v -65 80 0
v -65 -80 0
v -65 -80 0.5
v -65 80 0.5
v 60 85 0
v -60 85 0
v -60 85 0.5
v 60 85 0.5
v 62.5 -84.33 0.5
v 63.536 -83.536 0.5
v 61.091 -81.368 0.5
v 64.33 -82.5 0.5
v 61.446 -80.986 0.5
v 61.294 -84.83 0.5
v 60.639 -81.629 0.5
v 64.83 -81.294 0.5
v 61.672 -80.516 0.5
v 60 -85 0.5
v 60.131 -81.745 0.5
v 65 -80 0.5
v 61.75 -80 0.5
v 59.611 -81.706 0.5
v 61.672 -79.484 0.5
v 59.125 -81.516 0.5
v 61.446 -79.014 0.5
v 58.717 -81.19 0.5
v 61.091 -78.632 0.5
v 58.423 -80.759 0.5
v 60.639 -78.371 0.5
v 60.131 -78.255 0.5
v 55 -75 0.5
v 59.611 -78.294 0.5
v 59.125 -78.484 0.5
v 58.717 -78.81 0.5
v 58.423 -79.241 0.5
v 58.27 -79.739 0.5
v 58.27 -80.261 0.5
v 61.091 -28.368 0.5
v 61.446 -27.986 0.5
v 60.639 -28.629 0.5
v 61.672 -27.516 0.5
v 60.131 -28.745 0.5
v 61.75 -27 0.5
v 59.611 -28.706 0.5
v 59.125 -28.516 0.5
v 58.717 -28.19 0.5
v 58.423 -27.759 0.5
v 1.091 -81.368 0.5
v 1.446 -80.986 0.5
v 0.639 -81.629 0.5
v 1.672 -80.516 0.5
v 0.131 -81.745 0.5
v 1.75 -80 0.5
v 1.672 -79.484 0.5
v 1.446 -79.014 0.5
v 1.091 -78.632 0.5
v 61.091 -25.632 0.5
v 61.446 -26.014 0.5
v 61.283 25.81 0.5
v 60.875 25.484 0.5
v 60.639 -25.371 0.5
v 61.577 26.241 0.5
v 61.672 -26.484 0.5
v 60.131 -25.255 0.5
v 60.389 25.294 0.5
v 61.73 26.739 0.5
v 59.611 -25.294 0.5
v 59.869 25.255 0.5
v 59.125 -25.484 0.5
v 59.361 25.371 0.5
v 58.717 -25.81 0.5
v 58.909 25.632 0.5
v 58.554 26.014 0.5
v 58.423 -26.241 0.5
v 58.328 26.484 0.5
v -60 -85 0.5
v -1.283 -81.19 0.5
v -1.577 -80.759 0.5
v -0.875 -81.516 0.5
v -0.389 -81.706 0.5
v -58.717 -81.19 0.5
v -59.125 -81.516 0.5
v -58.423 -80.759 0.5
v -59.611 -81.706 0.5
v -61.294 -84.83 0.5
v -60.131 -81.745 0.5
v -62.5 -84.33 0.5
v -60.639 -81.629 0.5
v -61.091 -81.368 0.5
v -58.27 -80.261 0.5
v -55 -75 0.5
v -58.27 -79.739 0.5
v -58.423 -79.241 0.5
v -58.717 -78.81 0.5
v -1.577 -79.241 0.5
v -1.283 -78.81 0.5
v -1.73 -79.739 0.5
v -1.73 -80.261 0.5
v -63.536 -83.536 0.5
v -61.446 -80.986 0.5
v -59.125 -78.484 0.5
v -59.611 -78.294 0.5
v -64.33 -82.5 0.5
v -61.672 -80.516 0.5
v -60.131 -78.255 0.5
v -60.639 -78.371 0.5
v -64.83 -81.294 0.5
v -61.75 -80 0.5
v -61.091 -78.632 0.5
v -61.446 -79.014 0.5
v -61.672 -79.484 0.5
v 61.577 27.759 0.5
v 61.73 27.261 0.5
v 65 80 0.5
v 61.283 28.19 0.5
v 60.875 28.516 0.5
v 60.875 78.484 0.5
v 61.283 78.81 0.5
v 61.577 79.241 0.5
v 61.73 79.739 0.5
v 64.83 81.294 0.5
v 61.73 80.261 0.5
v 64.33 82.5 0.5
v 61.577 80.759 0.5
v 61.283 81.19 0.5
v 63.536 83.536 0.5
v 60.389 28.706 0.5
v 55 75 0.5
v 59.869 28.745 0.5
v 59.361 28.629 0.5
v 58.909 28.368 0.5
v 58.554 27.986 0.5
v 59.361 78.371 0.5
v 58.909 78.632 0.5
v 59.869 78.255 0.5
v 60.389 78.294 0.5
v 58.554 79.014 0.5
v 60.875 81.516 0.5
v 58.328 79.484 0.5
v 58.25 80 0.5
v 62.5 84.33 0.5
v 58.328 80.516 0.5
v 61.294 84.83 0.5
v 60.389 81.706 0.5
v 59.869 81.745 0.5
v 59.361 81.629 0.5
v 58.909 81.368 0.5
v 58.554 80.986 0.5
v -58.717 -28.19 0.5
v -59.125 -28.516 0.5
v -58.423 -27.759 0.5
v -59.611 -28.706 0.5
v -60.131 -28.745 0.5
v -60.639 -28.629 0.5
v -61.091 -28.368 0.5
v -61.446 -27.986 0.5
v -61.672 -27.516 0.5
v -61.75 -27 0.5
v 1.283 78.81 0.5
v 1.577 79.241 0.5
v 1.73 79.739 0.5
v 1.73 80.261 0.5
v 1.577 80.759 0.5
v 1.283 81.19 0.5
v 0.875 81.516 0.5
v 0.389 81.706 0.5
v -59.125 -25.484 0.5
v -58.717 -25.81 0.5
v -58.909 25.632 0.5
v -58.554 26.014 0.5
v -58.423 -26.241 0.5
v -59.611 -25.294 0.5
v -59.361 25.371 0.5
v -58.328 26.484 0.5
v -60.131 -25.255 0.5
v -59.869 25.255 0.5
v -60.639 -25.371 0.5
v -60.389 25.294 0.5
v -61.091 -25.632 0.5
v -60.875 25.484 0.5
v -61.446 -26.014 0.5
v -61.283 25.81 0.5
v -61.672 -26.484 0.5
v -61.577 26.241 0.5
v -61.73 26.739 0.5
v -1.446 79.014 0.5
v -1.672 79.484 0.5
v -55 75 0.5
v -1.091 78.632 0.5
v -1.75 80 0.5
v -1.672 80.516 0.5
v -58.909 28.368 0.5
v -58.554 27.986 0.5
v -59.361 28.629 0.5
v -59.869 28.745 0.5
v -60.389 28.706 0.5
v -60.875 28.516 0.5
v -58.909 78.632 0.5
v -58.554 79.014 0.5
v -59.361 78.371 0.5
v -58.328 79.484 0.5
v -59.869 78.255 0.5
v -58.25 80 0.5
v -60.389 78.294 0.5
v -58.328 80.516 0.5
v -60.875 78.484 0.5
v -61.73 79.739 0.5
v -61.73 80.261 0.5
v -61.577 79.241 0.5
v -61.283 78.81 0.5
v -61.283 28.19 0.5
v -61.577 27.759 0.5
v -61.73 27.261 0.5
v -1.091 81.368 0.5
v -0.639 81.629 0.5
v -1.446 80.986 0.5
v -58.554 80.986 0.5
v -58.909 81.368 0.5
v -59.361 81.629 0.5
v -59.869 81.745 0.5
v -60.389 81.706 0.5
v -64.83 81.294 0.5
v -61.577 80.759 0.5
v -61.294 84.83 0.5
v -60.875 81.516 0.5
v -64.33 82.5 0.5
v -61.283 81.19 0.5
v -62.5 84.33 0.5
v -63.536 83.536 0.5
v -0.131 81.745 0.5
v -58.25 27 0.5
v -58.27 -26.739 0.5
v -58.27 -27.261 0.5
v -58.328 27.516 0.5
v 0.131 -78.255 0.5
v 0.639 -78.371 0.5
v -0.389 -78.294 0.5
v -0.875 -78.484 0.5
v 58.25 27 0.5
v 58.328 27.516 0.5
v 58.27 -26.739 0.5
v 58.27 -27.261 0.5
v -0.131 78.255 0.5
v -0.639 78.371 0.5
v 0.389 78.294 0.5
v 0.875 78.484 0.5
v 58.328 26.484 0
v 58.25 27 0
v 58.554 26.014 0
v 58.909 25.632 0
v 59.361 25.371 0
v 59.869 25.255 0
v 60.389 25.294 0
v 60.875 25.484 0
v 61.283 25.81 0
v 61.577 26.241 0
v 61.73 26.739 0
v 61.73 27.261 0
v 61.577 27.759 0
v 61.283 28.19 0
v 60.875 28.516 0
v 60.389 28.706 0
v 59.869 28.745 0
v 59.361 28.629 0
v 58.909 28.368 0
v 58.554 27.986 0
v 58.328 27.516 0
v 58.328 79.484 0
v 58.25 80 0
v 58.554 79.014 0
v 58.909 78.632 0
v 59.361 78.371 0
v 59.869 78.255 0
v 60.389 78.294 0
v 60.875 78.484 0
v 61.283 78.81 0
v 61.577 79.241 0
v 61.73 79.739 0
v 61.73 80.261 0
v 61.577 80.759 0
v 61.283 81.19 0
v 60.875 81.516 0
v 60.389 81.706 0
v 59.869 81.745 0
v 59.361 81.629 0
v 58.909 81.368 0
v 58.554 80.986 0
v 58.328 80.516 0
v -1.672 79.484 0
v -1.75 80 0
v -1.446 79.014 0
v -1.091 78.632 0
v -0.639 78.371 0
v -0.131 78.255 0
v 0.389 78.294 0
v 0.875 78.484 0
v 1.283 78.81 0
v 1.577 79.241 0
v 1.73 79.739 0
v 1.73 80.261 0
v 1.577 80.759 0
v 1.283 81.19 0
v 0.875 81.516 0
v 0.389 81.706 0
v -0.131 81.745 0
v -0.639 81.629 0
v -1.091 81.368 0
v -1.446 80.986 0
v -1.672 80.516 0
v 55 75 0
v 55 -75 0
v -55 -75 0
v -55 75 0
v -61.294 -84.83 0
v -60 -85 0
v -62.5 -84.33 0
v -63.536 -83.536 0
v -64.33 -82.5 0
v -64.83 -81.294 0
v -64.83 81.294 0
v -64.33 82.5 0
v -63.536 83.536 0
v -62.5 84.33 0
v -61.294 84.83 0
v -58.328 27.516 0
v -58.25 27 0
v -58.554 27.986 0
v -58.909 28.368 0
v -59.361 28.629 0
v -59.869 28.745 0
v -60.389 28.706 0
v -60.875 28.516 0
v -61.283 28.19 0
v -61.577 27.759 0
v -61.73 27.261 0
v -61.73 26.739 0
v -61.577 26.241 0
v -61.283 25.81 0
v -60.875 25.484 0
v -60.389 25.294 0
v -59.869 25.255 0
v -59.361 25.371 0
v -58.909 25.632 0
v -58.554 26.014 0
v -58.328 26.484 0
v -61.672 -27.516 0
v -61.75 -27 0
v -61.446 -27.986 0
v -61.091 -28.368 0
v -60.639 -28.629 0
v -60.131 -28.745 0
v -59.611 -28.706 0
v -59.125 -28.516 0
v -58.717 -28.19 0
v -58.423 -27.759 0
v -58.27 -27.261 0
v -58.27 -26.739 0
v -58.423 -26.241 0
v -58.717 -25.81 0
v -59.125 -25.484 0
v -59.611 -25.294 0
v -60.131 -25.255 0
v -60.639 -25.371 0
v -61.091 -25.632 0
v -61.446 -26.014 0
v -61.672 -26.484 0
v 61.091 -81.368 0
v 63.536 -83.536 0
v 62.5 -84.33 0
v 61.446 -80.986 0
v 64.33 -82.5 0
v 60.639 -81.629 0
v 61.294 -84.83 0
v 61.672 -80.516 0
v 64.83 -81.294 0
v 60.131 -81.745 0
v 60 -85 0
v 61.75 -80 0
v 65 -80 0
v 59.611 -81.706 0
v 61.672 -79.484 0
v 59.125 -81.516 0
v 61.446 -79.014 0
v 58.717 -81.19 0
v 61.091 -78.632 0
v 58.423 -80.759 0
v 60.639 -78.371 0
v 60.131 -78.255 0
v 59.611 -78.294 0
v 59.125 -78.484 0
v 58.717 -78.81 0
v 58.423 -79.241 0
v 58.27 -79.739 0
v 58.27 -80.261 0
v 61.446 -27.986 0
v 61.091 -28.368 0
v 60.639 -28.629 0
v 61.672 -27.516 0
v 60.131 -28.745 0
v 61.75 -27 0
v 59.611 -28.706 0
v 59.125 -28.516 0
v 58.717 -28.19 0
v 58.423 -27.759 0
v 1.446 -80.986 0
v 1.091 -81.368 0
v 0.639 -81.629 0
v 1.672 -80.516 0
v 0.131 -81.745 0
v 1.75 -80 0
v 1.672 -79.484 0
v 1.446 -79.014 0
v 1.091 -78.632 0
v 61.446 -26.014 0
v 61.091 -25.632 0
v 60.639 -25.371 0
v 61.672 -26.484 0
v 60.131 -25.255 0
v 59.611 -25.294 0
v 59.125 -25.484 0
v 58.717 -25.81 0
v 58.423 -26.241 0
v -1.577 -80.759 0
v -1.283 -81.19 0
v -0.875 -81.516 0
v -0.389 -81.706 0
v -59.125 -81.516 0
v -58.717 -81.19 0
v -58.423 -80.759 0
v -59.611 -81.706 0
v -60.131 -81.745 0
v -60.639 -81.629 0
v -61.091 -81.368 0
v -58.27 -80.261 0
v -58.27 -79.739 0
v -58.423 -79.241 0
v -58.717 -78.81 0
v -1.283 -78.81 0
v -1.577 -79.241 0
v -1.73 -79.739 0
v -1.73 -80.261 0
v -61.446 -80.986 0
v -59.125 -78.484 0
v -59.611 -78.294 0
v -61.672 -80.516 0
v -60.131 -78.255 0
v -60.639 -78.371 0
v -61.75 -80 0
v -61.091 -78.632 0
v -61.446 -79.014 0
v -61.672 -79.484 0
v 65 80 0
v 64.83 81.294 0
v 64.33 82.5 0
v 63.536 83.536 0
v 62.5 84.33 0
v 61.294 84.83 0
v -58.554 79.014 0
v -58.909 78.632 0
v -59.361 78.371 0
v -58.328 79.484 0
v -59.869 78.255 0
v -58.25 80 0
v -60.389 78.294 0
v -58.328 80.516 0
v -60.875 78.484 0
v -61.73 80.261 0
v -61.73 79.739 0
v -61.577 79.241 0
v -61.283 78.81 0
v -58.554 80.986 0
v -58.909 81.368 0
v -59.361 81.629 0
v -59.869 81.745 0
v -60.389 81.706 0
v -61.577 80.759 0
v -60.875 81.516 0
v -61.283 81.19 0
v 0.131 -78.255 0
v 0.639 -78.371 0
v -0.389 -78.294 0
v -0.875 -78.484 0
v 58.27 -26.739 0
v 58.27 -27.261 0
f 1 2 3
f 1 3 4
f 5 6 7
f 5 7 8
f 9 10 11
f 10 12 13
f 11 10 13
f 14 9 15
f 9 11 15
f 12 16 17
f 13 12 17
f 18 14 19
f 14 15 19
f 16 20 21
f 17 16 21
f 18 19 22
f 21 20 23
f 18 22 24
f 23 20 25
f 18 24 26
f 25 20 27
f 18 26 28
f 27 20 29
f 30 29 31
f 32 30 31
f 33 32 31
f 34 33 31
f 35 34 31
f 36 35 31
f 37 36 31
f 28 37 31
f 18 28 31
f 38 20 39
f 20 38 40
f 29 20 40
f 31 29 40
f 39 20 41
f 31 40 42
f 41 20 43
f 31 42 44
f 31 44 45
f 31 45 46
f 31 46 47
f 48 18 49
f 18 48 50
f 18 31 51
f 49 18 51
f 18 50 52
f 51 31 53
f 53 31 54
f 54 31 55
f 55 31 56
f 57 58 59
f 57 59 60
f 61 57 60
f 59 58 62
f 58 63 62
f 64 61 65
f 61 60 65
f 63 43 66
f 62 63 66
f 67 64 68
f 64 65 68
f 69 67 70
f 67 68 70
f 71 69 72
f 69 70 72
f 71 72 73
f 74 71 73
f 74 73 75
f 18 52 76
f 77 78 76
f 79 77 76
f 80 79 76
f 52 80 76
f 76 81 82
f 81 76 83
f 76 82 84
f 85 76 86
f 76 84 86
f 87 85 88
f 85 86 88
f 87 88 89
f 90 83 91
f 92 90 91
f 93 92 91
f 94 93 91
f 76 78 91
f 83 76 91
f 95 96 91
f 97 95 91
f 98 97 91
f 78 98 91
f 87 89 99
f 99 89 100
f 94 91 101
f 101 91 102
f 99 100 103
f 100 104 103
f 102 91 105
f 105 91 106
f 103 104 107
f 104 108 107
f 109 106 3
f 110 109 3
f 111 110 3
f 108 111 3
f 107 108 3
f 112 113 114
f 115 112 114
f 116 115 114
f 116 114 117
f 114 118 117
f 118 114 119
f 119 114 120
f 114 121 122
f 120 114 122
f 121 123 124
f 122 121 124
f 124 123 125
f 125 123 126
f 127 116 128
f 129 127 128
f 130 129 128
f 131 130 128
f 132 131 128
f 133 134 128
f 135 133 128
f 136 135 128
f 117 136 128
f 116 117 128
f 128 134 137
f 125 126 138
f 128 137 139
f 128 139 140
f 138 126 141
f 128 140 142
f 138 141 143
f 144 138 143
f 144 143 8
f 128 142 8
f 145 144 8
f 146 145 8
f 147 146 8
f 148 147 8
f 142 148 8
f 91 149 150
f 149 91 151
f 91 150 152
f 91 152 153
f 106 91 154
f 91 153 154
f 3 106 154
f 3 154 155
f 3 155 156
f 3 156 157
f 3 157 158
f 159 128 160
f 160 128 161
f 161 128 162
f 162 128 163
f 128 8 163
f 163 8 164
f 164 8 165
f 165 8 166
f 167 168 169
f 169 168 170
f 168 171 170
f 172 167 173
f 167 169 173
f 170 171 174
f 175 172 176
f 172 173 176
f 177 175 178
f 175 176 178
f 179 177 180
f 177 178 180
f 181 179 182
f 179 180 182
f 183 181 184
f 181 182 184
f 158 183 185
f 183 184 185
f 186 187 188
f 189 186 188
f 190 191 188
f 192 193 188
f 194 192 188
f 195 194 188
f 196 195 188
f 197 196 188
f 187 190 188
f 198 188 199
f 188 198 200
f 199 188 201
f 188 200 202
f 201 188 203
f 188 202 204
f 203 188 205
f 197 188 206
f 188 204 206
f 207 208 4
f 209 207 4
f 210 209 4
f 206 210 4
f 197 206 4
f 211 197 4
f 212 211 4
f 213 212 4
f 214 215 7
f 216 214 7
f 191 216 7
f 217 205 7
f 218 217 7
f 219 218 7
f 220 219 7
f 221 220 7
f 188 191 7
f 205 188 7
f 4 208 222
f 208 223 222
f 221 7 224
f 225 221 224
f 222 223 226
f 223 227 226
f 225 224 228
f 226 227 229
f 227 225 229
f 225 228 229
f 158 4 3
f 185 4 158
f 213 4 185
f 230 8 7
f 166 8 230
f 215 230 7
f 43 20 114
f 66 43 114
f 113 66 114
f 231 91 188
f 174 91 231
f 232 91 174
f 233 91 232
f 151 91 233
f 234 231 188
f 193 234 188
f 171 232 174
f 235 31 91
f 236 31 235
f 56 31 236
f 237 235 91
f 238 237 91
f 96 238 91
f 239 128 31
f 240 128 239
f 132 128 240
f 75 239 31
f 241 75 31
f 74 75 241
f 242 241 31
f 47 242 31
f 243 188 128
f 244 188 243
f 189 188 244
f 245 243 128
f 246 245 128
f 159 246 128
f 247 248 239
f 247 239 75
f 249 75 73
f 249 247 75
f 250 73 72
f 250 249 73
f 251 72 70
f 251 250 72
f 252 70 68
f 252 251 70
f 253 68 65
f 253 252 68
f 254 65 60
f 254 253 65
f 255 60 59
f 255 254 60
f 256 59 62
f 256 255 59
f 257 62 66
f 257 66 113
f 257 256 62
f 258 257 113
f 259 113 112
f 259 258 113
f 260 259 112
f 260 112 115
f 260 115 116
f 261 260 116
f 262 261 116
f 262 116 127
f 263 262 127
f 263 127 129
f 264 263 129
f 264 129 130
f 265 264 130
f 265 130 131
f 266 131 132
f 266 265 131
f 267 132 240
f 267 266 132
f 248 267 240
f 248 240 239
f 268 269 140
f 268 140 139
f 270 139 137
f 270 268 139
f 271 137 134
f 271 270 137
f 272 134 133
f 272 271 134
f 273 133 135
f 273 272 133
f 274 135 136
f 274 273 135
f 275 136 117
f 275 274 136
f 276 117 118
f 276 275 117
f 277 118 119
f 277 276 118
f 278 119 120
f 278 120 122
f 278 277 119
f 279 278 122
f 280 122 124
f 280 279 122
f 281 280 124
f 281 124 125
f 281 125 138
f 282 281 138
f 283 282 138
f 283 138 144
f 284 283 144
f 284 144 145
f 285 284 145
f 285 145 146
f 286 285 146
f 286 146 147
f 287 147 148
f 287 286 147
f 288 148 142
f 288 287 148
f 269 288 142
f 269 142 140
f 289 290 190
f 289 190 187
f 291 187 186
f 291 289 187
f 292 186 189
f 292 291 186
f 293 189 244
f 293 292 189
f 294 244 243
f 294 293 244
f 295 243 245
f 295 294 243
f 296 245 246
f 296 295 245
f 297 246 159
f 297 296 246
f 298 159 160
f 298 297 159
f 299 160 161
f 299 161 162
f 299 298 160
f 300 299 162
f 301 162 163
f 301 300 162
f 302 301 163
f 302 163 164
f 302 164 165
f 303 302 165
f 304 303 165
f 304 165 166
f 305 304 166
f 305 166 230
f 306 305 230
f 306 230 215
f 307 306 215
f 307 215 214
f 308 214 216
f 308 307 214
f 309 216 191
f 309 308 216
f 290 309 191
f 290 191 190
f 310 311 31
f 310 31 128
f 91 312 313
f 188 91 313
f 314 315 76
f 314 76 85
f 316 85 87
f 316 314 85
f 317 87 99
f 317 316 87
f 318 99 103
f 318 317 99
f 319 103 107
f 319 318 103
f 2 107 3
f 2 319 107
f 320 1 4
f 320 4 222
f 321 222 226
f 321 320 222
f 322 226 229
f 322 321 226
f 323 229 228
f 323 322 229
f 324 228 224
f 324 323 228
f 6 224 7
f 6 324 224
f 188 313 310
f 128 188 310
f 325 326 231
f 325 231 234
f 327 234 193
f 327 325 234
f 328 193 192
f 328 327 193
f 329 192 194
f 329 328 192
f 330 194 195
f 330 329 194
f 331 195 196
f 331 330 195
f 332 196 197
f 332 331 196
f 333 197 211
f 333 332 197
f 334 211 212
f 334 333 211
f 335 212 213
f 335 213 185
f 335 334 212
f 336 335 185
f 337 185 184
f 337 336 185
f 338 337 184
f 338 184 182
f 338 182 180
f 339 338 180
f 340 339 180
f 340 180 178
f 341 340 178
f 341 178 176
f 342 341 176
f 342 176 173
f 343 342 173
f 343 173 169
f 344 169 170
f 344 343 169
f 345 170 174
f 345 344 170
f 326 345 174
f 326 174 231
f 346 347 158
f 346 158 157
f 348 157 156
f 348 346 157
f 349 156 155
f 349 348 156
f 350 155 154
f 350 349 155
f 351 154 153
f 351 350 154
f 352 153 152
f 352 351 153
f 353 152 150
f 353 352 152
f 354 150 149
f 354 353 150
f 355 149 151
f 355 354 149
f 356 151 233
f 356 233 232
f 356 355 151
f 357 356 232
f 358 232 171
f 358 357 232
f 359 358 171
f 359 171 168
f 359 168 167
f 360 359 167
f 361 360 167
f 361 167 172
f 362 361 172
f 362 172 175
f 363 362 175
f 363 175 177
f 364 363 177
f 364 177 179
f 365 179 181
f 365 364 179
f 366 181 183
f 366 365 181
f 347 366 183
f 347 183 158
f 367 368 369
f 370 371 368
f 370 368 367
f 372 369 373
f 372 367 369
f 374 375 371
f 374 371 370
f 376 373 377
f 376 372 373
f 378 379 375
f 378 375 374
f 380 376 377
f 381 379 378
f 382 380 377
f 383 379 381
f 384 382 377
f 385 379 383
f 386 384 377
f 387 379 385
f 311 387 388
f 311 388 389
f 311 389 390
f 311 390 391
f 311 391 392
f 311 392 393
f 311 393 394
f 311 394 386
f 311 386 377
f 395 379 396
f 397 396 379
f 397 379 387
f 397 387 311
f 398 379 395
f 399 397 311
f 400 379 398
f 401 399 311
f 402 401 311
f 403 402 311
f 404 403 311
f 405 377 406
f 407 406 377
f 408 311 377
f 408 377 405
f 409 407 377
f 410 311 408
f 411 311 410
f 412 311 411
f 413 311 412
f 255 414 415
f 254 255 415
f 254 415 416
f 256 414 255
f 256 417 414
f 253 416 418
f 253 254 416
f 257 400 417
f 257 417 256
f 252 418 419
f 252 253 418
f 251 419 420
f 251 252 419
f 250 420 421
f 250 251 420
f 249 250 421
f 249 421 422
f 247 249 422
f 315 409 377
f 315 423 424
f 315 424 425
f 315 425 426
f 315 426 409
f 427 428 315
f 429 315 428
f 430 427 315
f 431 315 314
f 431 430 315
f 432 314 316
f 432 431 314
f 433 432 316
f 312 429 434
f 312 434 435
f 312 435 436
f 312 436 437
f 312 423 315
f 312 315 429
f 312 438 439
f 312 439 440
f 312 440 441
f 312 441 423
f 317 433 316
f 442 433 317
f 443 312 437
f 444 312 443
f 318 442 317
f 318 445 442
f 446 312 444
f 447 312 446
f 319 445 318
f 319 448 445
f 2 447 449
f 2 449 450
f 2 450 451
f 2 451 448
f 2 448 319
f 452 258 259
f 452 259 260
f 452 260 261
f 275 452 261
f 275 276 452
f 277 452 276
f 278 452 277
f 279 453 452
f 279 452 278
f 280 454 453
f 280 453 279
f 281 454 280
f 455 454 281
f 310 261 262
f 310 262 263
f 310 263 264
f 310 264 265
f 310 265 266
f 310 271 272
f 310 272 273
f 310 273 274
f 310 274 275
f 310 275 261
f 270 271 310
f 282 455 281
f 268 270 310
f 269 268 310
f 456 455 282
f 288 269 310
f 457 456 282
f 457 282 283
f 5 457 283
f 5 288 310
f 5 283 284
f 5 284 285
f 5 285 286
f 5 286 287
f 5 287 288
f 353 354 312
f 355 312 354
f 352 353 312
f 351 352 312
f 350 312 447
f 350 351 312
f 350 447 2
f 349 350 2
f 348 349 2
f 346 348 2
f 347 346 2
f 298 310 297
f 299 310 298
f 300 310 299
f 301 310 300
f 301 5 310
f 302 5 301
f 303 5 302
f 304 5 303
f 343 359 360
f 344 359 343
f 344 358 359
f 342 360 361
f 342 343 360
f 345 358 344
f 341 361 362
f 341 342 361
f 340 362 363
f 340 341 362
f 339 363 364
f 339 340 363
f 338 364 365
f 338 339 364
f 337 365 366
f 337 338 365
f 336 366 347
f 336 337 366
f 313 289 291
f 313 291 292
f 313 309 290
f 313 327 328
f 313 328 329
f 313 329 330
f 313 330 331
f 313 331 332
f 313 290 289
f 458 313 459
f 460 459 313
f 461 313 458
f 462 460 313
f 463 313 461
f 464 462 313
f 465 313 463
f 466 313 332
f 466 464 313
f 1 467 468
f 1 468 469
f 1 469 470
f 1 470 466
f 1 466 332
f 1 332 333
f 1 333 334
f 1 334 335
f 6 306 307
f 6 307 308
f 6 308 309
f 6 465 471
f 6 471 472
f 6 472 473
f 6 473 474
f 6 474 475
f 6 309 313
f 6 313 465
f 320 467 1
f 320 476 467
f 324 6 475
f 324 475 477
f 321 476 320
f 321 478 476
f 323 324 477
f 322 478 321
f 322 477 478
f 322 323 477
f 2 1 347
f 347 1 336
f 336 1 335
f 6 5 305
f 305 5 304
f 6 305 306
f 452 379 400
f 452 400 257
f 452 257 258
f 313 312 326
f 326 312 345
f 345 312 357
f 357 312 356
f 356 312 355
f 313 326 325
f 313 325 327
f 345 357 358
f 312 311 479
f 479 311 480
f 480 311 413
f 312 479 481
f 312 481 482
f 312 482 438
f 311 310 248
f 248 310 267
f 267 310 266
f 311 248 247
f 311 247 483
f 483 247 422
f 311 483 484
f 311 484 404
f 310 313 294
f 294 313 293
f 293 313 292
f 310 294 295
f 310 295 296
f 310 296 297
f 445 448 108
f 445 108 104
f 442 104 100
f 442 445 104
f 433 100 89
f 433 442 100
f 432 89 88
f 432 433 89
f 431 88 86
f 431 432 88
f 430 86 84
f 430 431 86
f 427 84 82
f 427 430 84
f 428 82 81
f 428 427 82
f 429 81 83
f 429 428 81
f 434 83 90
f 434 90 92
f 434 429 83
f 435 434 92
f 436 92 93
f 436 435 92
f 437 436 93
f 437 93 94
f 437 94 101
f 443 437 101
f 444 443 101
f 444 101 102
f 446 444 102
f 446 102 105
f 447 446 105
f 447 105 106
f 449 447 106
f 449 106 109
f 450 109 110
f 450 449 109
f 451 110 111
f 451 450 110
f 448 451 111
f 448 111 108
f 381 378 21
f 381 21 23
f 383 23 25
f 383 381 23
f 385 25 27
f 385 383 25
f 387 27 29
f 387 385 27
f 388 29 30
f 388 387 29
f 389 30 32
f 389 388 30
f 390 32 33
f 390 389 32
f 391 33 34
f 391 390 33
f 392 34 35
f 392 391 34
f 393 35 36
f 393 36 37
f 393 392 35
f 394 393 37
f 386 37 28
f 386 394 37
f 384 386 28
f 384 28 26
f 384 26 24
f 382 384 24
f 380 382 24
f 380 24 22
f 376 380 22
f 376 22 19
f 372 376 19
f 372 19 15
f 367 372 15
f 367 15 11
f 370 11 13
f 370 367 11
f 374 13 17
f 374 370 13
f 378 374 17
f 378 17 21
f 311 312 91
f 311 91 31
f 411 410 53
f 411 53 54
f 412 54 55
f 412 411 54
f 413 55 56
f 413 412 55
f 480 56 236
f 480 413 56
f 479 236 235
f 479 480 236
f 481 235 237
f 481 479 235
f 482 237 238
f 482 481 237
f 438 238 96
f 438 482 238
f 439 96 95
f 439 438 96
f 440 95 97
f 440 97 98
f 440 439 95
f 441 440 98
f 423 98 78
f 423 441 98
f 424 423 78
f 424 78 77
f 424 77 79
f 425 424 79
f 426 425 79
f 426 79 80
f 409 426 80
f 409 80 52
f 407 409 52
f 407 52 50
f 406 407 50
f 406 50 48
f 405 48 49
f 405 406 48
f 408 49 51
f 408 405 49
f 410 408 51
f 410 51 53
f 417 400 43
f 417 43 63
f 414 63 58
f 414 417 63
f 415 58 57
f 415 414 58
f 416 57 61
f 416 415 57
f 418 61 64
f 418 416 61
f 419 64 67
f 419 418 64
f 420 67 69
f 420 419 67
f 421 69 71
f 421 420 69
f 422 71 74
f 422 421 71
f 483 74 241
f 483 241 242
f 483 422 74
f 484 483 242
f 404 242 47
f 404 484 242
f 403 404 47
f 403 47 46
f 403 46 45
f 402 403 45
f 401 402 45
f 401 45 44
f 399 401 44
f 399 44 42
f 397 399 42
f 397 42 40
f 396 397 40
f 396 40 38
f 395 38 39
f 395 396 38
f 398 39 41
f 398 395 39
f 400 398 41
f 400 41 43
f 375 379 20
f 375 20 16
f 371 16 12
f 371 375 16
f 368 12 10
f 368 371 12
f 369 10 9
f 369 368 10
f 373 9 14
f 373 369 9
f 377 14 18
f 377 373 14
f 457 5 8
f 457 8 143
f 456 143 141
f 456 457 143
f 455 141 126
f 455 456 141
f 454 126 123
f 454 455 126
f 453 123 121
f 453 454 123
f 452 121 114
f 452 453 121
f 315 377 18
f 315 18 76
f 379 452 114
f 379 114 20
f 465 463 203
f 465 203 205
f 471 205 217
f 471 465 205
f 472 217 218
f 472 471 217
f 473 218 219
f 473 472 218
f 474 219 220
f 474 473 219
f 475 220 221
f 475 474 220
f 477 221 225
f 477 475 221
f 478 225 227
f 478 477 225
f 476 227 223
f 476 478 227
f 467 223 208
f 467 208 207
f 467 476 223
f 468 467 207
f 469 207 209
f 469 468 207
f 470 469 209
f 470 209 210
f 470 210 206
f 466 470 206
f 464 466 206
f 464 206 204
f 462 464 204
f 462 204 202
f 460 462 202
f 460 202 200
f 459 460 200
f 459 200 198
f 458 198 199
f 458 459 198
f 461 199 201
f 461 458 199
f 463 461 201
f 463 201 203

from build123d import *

# Parameters (mm, degrees)
SKETCH1_R           = 1.75
SKETCH1_W           = 110
SKETCH1_H           = 150
BOSS_EXTRUDE1_DEPTH = 0.5


with BuildPart() as part:
    # Sketch1 → Boss-Extrude1 (new body)
    with BuildSketch(Plane.XY):
        with BuildLine():
            Line((60, -85), (-60, -85))
            ThreePointArc((-60, -85), (-63.535533906, -83.535533906), (-65, -80))
            Line((-65, -80), (-65, 80))
            ThreePointArc((-65, 80), (-63.535533906, 83.535533906), (-60, 85))
            Line((-60, 85), (60, 85))
            ThreePointArc((60, 85), (63.535533906, 83.535533906), (65, 80))
            Line((65, 80), (65, -80))
            ThreePointArc((65, -80), (63.535533906, -83.535533906), (60, -85))
        make_face()
        with Locations((60, -27)):
            Circle(SKETCH1_R, mode=Mode.SUBTRACT)
        with Locations((60, -80)):
            Circle(SKETCH1_R, mode=Mode.SUBTRACT)
        with Locations(Location((-60, -27, 0), (0, 0, 180))):
            Circle(SKETCH1_R, mode=Mode.SUBTRACT)
        with Locations(Location((-60, -80, 0), (0, 0, 180))):
            Circle(SKETCH1_R, mode=Mode.SUBTRACT)
        with Locations((0, -80)):
            Circle(SKETCH1_R, mode=Mode.SUBTRACT)
        with Locations(Location((60, 27, 0), (0, 0, 180))):
            Circle(SKETCH1_R, mode=Mode.SUBTRACT)
        with Locations(Location((60, 80, 0), (0, 0, 180))):
            Circle(SKETCH1_R, mode=Mode.SUBTRACT)
        with Locations(Location((0, 80, 0), (0, 0, 180))):
            Circle(SKETCH1_R, mode=Mode.SUBTRACT)
        with Locations((-60, 27)):
            Circle(SKETCH1_R, mode=Mode.SUBTRACT)
        with Locations((-60, 80)):
            Circle(SKETCH1_R, mode=Mode.SUBTRACT)
        Rectangle(SKETCH1_W, SKETCH1_H, mode=Mode.SUBTRACT)
    extrude(amount=BOSS_EXTRUDE1_DEPTH)


solid = part.part
